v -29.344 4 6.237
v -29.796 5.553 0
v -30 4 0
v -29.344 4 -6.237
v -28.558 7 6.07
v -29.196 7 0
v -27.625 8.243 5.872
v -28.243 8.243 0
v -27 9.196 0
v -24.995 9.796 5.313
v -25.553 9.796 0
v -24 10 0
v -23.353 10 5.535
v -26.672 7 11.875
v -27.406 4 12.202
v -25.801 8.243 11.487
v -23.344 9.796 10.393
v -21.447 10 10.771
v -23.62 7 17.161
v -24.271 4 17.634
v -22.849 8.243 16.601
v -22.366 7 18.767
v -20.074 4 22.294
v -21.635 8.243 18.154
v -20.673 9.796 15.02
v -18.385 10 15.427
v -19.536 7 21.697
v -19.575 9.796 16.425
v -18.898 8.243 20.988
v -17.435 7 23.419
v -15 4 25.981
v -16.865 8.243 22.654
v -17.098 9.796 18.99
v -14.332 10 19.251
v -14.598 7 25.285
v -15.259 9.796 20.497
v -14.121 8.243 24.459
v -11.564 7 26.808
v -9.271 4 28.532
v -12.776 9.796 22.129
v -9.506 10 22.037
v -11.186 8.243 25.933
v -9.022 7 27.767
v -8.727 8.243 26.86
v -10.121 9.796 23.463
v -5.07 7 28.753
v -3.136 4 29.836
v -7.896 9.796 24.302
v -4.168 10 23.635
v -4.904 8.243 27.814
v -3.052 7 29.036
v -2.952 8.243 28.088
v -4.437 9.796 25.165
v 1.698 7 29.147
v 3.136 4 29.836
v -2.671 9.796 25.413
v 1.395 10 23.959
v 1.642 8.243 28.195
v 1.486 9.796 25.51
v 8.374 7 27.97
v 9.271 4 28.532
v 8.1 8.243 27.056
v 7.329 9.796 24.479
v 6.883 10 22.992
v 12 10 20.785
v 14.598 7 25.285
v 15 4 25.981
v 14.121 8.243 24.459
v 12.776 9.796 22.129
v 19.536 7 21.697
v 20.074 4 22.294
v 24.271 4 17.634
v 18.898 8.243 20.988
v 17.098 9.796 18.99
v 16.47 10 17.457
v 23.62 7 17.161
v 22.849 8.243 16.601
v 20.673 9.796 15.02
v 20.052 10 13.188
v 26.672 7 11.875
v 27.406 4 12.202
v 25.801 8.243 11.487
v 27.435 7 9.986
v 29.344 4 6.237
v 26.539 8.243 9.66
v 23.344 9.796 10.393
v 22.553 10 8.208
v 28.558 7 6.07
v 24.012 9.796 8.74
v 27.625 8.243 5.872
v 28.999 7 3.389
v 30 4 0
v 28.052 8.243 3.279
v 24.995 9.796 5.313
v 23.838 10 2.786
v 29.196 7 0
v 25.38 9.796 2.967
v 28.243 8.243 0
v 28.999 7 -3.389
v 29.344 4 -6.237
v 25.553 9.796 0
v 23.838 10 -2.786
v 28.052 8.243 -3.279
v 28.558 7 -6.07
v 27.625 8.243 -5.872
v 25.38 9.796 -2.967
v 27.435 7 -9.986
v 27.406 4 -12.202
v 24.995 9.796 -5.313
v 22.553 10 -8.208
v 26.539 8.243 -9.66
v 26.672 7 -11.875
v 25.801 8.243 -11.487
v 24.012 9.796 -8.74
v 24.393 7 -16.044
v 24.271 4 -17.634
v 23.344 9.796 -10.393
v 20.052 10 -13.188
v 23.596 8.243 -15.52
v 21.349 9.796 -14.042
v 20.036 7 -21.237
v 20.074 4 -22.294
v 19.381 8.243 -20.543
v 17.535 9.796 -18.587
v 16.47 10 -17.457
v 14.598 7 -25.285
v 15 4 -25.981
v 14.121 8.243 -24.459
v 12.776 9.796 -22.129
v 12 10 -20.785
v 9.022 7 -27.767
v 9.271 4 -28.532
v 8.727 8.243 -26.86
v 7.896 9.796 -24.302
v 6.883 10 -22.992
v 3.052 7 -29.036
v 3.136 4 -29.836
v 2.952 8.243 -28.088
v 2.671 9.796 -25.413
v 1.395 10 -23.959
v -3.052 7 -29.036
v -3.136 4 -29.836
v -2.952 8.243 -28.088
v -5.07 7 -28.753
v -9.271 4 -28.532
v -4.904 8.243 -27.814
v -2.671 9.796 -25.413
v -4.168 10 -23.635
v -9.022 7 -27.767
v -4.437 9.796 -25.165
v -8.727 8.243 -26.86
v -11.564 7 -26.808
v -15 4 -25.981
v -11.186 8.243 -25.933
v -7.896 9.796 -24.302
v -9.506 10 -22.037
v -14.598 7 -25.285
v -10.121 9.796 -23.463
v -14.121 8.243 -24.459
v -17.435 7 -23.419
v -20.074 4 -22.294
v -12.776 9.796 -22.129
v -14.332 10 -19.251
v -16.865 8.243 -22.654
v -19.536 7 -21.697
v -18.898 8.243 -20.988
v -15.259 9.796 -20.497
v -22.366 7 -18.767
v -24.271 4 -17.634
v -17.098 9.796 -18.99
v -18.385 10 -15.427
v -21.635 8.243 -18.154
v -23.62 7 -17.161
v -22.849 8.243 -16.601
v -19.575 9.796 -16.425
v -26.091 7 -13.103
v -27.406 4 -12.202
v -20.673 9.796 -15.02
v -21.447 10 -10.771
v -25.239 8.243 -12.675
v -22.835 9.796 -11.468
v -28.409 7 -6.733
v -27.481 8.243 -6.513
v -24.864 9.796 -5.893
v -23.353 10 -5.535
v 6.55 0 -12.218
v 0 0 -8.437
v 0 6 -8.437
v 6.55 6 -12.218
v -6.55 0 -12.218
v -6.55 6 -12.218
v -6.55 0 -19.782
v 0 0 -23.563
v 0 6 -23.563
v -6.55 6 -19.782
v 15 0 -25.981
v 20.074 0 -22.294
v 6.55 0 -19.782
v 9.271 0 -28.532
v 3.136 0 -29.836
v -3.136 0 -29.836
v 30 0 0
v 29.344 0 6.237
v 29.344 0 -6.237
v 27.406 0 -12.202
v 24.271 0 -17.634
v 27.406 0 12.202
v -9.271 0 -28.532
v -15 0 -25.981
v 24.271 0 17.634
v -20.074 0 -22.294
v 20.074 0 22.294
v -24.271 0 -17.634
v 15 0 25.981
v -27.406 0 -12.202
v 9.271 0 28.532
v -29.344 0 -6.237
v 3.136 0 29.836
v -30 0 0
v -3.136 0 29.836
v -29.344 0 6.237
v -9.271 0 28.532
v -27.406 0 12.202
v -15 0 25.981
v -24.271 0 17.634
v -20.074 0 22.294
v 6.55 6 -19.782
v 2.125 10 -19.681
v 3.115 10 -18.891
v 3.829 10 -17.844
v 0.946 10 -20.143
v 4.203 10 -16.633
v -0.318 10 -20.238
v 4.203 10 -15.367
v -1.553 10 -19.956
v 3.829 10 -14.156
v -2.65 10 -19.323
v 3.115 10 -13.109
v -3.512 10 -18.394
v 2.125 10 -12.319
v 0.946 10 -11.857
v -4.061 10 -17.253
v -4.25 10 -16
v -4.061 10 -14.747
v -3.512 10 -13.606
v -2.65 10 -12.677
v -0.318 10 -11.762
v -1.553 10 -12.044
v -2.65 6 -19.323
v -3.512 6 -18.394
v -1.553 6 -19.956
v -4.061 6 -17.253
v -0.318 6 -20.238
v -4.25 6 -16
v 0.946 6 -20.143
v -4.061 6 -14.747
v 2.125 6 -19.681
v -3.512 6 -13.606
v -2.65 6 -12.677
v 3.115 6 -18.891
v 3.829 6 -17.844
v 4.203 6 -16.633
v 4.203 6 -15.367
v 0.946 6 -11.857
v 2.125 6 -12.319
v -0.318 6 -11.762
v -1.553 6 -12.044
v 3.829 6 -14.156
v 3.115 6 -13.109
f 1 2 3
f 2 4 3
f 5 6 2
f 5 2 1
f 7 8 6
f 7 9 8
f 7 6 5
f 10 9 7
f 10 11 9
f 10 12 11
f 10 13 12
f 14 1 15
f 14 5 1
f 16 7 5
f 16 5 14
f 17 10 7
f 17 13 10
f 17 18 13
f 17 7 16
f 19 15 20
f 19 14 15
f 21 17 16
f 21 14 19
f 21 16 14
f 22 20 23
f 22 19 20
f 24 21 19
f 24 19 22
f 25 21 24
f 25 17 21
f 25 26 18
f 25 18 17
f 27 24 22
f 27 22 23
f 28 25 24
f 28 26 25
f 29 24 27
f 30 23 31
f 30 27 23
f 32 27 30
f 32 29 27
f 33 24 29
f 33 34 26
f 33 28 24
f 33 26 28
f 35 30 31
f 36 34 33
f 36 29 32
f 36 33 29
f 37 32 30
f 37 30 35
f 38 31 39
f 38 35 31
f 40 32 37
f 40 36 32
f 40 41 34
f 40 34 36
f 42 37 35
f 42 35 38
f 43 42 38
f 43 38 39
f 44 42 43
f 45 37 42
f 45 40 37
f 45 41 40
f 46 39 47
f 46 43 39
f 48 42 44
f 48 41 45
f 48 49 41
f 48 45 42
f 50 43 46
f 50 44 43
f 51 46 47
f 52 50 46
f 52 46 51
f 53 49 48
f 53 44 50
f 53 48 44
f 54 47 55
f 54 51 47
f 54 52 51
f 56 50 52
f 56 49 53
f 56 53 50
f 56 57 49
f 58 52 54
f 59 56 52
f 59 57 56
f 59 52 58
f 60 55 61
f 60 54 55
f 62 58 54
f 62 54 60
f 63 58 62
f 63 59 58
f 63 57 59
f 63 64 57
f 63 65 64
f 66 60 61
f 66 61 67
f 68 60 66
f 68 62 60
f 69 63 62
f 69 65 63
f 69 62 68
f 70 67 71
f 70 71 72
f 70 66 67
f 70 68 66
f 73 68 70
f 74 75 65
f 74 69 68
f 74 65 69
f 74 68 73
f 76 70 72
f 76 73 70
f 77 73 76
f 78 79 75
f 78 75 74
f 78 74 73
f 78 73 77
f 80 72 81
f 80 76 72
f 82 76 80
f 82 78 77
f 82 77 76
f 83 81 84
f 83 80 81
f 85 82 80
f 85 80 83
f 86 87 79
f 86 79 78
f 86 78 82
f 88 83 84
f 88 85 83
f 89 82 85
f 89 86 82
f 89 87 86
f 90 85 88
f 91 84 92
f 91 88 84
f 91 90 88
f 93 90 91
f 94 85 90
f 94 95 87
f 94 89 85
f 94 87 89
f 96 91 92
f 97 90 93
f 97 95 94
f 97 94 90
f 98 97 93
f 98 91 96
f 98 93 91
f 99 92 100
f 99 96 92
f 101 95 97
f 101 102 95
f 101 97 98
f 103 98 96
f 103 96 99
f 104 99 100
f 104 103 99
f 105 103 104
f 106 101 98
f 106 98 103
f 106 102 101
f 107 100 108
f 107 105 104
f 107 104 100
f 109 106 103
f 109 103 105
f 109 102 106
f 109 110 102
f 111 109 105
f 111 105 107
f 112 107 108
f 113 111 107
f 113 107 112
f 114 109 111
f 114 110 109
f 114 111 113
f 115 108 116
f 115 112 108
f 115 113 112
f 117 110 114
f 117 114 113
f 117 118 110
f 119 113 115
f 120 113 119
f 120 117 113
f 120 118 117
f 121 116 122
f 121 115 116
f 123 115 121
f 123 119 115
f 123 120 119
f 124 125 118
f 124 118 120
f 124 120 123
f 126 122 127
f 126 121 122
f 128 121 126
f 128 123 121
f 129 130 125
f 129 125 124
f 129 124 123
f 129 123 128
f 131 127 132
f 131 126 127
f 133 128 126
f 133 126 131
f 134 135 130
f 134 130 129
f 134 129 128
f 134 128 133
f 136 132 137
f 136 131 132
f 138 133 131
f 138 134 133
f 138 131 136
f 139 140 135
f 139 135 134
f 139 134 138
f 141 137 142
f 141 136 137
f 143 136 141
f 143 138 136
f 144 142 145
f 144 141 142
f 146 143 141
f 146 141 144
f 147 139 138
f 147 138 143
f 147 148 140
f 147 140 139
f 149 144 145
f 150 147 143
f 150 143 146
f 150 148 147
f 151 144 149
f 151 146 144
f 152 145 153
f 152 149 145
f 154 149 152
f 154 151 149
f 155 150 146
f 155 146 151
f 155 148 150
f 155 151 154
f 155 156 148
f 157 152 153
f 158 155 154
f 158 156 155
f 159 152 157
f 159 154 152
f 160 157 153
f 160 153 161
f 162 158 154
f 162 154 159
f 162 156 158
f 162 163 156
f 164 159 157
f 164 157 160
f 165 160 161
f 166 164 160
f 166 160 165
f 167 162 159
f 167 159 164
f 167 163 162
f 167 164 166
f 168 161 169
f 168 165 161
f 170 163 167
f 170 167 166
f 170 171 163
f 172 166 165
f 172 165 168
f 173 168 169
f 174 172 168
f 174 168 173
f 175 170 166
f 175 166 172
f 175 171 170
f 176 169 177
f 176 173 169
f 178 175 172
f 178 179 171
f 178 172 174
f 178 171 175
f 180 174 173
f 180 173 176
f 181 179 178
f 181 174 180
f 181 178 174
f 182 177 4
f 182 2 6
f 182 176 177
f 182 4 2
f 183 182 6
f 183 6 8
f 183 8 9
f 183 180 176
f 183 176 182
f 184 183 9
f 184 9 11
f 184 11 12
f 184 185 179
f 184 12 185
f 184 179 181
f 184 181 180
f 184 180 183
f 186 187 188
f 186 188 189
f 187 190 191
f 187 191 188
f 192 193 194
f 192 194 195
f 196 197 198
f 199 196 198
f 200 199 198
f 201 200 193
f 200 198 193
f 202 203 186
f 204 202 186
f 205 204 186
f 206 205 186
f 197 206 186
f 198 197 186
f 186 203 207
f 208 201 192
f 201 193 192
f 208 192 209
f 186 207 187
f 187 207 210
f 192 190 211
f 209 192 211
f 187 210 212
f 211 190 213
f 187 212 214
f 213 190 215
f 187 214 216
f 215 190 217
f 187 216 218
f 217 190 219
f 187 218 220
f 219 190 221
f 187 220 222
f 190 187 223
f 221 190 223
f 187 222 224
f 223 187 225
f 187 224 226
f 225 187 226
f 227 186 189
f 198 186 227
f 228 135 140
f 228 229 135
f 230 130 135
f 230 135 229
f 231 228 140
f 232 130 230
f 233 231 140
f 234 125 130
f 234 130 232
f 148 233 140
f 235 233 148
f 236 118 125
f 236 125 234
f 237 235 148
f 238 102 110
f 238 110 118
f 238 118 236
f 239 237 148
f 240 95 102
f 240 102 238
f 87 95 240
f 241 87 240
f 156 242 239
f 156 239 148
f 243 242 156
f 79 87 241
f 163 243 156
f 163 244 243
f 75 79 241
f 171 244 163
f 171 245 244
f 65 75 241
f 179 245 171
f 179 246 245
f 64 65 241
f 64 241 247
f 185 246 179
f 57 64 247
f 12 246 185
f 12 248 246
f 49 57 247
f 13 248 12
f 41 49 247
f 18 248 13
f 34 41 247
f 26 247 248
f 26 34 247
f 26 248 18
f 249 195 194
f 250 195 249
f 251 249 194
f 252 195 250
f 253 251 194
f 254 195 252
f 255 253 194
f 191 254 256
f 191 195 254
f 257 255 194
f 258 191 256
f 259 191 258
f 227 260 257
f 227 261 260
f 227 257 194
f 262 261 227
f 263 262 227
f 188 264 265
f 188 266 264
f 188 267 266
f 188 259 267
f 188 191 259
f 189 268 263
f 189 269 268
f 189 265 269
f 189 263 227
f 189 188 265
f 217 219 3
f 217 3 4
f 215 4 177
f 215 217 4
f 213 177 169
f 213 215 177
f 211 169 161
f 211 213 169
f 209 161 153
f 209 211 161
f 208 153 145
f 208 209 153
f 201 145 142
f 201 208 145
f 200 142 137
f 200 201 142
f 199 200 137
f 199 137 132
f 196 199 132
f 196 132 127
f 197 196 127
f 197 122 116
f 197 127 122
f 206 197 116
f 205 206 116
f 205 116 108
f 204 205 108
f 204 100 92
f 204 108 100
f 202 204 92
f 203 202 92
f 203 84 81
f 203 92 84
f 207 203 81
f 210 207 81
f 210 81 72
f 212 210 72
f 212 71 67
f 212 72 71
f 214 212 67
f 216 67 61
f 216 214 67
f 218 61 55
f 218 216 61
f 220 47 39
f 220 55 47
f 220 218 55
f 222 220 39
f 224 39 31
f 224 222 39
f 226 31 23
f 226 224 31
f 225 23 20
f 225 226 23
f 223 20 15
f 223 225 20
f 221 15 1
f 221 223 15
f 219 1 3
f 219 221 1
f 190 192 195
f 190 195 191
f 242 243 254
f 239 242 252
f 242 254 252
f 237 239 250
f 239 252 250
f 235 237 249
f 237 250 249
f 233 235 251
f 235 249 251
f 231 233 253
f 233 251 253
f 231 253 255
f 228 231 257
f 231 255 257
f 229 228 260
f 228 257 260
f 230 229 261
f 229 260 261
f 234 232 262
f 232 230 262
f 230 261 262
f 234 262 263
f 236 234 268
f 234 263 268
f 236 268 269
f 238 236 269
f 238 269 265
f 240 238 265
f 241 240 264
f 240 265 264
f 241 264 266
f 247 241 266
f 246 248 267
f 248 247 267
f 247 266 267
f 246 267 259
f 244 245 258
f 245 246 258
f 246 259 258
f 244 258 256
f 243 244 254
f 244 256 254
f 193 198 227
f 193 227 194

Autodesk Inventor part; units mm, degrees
ref_plane "YZ Plane" through (0, 0, 0) normal (1, 0, 0) x (0, 1, 0)
ref_plane "XZ Plane" through (0, 0, 0) normal (0, 1, 0) x (-1, 0, 0)
ref_plane "XY Plane" through (0, 0, 0) normal (0, 0, 1) x (1, 0, 0)
sketch "Sketch1" plane through (0, 0, 0) normal (0, 1, 0) x (-1, 0, 0)
  circle A0 centre (0, 0) radius 30
  circle A1 centre (0, -16) radius 4.25
  dimension "d0" = 60
  dimension "d1" = 8.5
  dimension "d2" = 16
extrude "Extrusion1" add sketch "Sketch1" along normal blind 10
sketch "Sketch2" plane through (0, 0, 0) normal (0, -1, 0) x (1, 0, 0)
  circle A0 centre (0, -16) radius 4.25 construction
  line L0 (6.55, -19.7816) -> (0, -23.5633)
  line L1 (0, -23.5633) -> (-6.55, -19.7816)
  line L2 (-6.55, -19.7816) -> (-6.55, -12.2184)
  line L3 (-6.55, -12.2184) -> (0, -8.4367)
  line L4 (0, -8.4367) -> (6.55, -12.2184)
  line L5 (6.55, -12.2184) -> (6.55, -19.7816)
  point P0 (0, 0)
  dimension "d5" = 13.1
extrude "Extrusion2" cut sketch "Sketch2" against normal blind 6
fillet "Fillet1" radius 6 1 edges at (30, 10, 0)
properties part number "base" material "PC/ABS Plastic"
